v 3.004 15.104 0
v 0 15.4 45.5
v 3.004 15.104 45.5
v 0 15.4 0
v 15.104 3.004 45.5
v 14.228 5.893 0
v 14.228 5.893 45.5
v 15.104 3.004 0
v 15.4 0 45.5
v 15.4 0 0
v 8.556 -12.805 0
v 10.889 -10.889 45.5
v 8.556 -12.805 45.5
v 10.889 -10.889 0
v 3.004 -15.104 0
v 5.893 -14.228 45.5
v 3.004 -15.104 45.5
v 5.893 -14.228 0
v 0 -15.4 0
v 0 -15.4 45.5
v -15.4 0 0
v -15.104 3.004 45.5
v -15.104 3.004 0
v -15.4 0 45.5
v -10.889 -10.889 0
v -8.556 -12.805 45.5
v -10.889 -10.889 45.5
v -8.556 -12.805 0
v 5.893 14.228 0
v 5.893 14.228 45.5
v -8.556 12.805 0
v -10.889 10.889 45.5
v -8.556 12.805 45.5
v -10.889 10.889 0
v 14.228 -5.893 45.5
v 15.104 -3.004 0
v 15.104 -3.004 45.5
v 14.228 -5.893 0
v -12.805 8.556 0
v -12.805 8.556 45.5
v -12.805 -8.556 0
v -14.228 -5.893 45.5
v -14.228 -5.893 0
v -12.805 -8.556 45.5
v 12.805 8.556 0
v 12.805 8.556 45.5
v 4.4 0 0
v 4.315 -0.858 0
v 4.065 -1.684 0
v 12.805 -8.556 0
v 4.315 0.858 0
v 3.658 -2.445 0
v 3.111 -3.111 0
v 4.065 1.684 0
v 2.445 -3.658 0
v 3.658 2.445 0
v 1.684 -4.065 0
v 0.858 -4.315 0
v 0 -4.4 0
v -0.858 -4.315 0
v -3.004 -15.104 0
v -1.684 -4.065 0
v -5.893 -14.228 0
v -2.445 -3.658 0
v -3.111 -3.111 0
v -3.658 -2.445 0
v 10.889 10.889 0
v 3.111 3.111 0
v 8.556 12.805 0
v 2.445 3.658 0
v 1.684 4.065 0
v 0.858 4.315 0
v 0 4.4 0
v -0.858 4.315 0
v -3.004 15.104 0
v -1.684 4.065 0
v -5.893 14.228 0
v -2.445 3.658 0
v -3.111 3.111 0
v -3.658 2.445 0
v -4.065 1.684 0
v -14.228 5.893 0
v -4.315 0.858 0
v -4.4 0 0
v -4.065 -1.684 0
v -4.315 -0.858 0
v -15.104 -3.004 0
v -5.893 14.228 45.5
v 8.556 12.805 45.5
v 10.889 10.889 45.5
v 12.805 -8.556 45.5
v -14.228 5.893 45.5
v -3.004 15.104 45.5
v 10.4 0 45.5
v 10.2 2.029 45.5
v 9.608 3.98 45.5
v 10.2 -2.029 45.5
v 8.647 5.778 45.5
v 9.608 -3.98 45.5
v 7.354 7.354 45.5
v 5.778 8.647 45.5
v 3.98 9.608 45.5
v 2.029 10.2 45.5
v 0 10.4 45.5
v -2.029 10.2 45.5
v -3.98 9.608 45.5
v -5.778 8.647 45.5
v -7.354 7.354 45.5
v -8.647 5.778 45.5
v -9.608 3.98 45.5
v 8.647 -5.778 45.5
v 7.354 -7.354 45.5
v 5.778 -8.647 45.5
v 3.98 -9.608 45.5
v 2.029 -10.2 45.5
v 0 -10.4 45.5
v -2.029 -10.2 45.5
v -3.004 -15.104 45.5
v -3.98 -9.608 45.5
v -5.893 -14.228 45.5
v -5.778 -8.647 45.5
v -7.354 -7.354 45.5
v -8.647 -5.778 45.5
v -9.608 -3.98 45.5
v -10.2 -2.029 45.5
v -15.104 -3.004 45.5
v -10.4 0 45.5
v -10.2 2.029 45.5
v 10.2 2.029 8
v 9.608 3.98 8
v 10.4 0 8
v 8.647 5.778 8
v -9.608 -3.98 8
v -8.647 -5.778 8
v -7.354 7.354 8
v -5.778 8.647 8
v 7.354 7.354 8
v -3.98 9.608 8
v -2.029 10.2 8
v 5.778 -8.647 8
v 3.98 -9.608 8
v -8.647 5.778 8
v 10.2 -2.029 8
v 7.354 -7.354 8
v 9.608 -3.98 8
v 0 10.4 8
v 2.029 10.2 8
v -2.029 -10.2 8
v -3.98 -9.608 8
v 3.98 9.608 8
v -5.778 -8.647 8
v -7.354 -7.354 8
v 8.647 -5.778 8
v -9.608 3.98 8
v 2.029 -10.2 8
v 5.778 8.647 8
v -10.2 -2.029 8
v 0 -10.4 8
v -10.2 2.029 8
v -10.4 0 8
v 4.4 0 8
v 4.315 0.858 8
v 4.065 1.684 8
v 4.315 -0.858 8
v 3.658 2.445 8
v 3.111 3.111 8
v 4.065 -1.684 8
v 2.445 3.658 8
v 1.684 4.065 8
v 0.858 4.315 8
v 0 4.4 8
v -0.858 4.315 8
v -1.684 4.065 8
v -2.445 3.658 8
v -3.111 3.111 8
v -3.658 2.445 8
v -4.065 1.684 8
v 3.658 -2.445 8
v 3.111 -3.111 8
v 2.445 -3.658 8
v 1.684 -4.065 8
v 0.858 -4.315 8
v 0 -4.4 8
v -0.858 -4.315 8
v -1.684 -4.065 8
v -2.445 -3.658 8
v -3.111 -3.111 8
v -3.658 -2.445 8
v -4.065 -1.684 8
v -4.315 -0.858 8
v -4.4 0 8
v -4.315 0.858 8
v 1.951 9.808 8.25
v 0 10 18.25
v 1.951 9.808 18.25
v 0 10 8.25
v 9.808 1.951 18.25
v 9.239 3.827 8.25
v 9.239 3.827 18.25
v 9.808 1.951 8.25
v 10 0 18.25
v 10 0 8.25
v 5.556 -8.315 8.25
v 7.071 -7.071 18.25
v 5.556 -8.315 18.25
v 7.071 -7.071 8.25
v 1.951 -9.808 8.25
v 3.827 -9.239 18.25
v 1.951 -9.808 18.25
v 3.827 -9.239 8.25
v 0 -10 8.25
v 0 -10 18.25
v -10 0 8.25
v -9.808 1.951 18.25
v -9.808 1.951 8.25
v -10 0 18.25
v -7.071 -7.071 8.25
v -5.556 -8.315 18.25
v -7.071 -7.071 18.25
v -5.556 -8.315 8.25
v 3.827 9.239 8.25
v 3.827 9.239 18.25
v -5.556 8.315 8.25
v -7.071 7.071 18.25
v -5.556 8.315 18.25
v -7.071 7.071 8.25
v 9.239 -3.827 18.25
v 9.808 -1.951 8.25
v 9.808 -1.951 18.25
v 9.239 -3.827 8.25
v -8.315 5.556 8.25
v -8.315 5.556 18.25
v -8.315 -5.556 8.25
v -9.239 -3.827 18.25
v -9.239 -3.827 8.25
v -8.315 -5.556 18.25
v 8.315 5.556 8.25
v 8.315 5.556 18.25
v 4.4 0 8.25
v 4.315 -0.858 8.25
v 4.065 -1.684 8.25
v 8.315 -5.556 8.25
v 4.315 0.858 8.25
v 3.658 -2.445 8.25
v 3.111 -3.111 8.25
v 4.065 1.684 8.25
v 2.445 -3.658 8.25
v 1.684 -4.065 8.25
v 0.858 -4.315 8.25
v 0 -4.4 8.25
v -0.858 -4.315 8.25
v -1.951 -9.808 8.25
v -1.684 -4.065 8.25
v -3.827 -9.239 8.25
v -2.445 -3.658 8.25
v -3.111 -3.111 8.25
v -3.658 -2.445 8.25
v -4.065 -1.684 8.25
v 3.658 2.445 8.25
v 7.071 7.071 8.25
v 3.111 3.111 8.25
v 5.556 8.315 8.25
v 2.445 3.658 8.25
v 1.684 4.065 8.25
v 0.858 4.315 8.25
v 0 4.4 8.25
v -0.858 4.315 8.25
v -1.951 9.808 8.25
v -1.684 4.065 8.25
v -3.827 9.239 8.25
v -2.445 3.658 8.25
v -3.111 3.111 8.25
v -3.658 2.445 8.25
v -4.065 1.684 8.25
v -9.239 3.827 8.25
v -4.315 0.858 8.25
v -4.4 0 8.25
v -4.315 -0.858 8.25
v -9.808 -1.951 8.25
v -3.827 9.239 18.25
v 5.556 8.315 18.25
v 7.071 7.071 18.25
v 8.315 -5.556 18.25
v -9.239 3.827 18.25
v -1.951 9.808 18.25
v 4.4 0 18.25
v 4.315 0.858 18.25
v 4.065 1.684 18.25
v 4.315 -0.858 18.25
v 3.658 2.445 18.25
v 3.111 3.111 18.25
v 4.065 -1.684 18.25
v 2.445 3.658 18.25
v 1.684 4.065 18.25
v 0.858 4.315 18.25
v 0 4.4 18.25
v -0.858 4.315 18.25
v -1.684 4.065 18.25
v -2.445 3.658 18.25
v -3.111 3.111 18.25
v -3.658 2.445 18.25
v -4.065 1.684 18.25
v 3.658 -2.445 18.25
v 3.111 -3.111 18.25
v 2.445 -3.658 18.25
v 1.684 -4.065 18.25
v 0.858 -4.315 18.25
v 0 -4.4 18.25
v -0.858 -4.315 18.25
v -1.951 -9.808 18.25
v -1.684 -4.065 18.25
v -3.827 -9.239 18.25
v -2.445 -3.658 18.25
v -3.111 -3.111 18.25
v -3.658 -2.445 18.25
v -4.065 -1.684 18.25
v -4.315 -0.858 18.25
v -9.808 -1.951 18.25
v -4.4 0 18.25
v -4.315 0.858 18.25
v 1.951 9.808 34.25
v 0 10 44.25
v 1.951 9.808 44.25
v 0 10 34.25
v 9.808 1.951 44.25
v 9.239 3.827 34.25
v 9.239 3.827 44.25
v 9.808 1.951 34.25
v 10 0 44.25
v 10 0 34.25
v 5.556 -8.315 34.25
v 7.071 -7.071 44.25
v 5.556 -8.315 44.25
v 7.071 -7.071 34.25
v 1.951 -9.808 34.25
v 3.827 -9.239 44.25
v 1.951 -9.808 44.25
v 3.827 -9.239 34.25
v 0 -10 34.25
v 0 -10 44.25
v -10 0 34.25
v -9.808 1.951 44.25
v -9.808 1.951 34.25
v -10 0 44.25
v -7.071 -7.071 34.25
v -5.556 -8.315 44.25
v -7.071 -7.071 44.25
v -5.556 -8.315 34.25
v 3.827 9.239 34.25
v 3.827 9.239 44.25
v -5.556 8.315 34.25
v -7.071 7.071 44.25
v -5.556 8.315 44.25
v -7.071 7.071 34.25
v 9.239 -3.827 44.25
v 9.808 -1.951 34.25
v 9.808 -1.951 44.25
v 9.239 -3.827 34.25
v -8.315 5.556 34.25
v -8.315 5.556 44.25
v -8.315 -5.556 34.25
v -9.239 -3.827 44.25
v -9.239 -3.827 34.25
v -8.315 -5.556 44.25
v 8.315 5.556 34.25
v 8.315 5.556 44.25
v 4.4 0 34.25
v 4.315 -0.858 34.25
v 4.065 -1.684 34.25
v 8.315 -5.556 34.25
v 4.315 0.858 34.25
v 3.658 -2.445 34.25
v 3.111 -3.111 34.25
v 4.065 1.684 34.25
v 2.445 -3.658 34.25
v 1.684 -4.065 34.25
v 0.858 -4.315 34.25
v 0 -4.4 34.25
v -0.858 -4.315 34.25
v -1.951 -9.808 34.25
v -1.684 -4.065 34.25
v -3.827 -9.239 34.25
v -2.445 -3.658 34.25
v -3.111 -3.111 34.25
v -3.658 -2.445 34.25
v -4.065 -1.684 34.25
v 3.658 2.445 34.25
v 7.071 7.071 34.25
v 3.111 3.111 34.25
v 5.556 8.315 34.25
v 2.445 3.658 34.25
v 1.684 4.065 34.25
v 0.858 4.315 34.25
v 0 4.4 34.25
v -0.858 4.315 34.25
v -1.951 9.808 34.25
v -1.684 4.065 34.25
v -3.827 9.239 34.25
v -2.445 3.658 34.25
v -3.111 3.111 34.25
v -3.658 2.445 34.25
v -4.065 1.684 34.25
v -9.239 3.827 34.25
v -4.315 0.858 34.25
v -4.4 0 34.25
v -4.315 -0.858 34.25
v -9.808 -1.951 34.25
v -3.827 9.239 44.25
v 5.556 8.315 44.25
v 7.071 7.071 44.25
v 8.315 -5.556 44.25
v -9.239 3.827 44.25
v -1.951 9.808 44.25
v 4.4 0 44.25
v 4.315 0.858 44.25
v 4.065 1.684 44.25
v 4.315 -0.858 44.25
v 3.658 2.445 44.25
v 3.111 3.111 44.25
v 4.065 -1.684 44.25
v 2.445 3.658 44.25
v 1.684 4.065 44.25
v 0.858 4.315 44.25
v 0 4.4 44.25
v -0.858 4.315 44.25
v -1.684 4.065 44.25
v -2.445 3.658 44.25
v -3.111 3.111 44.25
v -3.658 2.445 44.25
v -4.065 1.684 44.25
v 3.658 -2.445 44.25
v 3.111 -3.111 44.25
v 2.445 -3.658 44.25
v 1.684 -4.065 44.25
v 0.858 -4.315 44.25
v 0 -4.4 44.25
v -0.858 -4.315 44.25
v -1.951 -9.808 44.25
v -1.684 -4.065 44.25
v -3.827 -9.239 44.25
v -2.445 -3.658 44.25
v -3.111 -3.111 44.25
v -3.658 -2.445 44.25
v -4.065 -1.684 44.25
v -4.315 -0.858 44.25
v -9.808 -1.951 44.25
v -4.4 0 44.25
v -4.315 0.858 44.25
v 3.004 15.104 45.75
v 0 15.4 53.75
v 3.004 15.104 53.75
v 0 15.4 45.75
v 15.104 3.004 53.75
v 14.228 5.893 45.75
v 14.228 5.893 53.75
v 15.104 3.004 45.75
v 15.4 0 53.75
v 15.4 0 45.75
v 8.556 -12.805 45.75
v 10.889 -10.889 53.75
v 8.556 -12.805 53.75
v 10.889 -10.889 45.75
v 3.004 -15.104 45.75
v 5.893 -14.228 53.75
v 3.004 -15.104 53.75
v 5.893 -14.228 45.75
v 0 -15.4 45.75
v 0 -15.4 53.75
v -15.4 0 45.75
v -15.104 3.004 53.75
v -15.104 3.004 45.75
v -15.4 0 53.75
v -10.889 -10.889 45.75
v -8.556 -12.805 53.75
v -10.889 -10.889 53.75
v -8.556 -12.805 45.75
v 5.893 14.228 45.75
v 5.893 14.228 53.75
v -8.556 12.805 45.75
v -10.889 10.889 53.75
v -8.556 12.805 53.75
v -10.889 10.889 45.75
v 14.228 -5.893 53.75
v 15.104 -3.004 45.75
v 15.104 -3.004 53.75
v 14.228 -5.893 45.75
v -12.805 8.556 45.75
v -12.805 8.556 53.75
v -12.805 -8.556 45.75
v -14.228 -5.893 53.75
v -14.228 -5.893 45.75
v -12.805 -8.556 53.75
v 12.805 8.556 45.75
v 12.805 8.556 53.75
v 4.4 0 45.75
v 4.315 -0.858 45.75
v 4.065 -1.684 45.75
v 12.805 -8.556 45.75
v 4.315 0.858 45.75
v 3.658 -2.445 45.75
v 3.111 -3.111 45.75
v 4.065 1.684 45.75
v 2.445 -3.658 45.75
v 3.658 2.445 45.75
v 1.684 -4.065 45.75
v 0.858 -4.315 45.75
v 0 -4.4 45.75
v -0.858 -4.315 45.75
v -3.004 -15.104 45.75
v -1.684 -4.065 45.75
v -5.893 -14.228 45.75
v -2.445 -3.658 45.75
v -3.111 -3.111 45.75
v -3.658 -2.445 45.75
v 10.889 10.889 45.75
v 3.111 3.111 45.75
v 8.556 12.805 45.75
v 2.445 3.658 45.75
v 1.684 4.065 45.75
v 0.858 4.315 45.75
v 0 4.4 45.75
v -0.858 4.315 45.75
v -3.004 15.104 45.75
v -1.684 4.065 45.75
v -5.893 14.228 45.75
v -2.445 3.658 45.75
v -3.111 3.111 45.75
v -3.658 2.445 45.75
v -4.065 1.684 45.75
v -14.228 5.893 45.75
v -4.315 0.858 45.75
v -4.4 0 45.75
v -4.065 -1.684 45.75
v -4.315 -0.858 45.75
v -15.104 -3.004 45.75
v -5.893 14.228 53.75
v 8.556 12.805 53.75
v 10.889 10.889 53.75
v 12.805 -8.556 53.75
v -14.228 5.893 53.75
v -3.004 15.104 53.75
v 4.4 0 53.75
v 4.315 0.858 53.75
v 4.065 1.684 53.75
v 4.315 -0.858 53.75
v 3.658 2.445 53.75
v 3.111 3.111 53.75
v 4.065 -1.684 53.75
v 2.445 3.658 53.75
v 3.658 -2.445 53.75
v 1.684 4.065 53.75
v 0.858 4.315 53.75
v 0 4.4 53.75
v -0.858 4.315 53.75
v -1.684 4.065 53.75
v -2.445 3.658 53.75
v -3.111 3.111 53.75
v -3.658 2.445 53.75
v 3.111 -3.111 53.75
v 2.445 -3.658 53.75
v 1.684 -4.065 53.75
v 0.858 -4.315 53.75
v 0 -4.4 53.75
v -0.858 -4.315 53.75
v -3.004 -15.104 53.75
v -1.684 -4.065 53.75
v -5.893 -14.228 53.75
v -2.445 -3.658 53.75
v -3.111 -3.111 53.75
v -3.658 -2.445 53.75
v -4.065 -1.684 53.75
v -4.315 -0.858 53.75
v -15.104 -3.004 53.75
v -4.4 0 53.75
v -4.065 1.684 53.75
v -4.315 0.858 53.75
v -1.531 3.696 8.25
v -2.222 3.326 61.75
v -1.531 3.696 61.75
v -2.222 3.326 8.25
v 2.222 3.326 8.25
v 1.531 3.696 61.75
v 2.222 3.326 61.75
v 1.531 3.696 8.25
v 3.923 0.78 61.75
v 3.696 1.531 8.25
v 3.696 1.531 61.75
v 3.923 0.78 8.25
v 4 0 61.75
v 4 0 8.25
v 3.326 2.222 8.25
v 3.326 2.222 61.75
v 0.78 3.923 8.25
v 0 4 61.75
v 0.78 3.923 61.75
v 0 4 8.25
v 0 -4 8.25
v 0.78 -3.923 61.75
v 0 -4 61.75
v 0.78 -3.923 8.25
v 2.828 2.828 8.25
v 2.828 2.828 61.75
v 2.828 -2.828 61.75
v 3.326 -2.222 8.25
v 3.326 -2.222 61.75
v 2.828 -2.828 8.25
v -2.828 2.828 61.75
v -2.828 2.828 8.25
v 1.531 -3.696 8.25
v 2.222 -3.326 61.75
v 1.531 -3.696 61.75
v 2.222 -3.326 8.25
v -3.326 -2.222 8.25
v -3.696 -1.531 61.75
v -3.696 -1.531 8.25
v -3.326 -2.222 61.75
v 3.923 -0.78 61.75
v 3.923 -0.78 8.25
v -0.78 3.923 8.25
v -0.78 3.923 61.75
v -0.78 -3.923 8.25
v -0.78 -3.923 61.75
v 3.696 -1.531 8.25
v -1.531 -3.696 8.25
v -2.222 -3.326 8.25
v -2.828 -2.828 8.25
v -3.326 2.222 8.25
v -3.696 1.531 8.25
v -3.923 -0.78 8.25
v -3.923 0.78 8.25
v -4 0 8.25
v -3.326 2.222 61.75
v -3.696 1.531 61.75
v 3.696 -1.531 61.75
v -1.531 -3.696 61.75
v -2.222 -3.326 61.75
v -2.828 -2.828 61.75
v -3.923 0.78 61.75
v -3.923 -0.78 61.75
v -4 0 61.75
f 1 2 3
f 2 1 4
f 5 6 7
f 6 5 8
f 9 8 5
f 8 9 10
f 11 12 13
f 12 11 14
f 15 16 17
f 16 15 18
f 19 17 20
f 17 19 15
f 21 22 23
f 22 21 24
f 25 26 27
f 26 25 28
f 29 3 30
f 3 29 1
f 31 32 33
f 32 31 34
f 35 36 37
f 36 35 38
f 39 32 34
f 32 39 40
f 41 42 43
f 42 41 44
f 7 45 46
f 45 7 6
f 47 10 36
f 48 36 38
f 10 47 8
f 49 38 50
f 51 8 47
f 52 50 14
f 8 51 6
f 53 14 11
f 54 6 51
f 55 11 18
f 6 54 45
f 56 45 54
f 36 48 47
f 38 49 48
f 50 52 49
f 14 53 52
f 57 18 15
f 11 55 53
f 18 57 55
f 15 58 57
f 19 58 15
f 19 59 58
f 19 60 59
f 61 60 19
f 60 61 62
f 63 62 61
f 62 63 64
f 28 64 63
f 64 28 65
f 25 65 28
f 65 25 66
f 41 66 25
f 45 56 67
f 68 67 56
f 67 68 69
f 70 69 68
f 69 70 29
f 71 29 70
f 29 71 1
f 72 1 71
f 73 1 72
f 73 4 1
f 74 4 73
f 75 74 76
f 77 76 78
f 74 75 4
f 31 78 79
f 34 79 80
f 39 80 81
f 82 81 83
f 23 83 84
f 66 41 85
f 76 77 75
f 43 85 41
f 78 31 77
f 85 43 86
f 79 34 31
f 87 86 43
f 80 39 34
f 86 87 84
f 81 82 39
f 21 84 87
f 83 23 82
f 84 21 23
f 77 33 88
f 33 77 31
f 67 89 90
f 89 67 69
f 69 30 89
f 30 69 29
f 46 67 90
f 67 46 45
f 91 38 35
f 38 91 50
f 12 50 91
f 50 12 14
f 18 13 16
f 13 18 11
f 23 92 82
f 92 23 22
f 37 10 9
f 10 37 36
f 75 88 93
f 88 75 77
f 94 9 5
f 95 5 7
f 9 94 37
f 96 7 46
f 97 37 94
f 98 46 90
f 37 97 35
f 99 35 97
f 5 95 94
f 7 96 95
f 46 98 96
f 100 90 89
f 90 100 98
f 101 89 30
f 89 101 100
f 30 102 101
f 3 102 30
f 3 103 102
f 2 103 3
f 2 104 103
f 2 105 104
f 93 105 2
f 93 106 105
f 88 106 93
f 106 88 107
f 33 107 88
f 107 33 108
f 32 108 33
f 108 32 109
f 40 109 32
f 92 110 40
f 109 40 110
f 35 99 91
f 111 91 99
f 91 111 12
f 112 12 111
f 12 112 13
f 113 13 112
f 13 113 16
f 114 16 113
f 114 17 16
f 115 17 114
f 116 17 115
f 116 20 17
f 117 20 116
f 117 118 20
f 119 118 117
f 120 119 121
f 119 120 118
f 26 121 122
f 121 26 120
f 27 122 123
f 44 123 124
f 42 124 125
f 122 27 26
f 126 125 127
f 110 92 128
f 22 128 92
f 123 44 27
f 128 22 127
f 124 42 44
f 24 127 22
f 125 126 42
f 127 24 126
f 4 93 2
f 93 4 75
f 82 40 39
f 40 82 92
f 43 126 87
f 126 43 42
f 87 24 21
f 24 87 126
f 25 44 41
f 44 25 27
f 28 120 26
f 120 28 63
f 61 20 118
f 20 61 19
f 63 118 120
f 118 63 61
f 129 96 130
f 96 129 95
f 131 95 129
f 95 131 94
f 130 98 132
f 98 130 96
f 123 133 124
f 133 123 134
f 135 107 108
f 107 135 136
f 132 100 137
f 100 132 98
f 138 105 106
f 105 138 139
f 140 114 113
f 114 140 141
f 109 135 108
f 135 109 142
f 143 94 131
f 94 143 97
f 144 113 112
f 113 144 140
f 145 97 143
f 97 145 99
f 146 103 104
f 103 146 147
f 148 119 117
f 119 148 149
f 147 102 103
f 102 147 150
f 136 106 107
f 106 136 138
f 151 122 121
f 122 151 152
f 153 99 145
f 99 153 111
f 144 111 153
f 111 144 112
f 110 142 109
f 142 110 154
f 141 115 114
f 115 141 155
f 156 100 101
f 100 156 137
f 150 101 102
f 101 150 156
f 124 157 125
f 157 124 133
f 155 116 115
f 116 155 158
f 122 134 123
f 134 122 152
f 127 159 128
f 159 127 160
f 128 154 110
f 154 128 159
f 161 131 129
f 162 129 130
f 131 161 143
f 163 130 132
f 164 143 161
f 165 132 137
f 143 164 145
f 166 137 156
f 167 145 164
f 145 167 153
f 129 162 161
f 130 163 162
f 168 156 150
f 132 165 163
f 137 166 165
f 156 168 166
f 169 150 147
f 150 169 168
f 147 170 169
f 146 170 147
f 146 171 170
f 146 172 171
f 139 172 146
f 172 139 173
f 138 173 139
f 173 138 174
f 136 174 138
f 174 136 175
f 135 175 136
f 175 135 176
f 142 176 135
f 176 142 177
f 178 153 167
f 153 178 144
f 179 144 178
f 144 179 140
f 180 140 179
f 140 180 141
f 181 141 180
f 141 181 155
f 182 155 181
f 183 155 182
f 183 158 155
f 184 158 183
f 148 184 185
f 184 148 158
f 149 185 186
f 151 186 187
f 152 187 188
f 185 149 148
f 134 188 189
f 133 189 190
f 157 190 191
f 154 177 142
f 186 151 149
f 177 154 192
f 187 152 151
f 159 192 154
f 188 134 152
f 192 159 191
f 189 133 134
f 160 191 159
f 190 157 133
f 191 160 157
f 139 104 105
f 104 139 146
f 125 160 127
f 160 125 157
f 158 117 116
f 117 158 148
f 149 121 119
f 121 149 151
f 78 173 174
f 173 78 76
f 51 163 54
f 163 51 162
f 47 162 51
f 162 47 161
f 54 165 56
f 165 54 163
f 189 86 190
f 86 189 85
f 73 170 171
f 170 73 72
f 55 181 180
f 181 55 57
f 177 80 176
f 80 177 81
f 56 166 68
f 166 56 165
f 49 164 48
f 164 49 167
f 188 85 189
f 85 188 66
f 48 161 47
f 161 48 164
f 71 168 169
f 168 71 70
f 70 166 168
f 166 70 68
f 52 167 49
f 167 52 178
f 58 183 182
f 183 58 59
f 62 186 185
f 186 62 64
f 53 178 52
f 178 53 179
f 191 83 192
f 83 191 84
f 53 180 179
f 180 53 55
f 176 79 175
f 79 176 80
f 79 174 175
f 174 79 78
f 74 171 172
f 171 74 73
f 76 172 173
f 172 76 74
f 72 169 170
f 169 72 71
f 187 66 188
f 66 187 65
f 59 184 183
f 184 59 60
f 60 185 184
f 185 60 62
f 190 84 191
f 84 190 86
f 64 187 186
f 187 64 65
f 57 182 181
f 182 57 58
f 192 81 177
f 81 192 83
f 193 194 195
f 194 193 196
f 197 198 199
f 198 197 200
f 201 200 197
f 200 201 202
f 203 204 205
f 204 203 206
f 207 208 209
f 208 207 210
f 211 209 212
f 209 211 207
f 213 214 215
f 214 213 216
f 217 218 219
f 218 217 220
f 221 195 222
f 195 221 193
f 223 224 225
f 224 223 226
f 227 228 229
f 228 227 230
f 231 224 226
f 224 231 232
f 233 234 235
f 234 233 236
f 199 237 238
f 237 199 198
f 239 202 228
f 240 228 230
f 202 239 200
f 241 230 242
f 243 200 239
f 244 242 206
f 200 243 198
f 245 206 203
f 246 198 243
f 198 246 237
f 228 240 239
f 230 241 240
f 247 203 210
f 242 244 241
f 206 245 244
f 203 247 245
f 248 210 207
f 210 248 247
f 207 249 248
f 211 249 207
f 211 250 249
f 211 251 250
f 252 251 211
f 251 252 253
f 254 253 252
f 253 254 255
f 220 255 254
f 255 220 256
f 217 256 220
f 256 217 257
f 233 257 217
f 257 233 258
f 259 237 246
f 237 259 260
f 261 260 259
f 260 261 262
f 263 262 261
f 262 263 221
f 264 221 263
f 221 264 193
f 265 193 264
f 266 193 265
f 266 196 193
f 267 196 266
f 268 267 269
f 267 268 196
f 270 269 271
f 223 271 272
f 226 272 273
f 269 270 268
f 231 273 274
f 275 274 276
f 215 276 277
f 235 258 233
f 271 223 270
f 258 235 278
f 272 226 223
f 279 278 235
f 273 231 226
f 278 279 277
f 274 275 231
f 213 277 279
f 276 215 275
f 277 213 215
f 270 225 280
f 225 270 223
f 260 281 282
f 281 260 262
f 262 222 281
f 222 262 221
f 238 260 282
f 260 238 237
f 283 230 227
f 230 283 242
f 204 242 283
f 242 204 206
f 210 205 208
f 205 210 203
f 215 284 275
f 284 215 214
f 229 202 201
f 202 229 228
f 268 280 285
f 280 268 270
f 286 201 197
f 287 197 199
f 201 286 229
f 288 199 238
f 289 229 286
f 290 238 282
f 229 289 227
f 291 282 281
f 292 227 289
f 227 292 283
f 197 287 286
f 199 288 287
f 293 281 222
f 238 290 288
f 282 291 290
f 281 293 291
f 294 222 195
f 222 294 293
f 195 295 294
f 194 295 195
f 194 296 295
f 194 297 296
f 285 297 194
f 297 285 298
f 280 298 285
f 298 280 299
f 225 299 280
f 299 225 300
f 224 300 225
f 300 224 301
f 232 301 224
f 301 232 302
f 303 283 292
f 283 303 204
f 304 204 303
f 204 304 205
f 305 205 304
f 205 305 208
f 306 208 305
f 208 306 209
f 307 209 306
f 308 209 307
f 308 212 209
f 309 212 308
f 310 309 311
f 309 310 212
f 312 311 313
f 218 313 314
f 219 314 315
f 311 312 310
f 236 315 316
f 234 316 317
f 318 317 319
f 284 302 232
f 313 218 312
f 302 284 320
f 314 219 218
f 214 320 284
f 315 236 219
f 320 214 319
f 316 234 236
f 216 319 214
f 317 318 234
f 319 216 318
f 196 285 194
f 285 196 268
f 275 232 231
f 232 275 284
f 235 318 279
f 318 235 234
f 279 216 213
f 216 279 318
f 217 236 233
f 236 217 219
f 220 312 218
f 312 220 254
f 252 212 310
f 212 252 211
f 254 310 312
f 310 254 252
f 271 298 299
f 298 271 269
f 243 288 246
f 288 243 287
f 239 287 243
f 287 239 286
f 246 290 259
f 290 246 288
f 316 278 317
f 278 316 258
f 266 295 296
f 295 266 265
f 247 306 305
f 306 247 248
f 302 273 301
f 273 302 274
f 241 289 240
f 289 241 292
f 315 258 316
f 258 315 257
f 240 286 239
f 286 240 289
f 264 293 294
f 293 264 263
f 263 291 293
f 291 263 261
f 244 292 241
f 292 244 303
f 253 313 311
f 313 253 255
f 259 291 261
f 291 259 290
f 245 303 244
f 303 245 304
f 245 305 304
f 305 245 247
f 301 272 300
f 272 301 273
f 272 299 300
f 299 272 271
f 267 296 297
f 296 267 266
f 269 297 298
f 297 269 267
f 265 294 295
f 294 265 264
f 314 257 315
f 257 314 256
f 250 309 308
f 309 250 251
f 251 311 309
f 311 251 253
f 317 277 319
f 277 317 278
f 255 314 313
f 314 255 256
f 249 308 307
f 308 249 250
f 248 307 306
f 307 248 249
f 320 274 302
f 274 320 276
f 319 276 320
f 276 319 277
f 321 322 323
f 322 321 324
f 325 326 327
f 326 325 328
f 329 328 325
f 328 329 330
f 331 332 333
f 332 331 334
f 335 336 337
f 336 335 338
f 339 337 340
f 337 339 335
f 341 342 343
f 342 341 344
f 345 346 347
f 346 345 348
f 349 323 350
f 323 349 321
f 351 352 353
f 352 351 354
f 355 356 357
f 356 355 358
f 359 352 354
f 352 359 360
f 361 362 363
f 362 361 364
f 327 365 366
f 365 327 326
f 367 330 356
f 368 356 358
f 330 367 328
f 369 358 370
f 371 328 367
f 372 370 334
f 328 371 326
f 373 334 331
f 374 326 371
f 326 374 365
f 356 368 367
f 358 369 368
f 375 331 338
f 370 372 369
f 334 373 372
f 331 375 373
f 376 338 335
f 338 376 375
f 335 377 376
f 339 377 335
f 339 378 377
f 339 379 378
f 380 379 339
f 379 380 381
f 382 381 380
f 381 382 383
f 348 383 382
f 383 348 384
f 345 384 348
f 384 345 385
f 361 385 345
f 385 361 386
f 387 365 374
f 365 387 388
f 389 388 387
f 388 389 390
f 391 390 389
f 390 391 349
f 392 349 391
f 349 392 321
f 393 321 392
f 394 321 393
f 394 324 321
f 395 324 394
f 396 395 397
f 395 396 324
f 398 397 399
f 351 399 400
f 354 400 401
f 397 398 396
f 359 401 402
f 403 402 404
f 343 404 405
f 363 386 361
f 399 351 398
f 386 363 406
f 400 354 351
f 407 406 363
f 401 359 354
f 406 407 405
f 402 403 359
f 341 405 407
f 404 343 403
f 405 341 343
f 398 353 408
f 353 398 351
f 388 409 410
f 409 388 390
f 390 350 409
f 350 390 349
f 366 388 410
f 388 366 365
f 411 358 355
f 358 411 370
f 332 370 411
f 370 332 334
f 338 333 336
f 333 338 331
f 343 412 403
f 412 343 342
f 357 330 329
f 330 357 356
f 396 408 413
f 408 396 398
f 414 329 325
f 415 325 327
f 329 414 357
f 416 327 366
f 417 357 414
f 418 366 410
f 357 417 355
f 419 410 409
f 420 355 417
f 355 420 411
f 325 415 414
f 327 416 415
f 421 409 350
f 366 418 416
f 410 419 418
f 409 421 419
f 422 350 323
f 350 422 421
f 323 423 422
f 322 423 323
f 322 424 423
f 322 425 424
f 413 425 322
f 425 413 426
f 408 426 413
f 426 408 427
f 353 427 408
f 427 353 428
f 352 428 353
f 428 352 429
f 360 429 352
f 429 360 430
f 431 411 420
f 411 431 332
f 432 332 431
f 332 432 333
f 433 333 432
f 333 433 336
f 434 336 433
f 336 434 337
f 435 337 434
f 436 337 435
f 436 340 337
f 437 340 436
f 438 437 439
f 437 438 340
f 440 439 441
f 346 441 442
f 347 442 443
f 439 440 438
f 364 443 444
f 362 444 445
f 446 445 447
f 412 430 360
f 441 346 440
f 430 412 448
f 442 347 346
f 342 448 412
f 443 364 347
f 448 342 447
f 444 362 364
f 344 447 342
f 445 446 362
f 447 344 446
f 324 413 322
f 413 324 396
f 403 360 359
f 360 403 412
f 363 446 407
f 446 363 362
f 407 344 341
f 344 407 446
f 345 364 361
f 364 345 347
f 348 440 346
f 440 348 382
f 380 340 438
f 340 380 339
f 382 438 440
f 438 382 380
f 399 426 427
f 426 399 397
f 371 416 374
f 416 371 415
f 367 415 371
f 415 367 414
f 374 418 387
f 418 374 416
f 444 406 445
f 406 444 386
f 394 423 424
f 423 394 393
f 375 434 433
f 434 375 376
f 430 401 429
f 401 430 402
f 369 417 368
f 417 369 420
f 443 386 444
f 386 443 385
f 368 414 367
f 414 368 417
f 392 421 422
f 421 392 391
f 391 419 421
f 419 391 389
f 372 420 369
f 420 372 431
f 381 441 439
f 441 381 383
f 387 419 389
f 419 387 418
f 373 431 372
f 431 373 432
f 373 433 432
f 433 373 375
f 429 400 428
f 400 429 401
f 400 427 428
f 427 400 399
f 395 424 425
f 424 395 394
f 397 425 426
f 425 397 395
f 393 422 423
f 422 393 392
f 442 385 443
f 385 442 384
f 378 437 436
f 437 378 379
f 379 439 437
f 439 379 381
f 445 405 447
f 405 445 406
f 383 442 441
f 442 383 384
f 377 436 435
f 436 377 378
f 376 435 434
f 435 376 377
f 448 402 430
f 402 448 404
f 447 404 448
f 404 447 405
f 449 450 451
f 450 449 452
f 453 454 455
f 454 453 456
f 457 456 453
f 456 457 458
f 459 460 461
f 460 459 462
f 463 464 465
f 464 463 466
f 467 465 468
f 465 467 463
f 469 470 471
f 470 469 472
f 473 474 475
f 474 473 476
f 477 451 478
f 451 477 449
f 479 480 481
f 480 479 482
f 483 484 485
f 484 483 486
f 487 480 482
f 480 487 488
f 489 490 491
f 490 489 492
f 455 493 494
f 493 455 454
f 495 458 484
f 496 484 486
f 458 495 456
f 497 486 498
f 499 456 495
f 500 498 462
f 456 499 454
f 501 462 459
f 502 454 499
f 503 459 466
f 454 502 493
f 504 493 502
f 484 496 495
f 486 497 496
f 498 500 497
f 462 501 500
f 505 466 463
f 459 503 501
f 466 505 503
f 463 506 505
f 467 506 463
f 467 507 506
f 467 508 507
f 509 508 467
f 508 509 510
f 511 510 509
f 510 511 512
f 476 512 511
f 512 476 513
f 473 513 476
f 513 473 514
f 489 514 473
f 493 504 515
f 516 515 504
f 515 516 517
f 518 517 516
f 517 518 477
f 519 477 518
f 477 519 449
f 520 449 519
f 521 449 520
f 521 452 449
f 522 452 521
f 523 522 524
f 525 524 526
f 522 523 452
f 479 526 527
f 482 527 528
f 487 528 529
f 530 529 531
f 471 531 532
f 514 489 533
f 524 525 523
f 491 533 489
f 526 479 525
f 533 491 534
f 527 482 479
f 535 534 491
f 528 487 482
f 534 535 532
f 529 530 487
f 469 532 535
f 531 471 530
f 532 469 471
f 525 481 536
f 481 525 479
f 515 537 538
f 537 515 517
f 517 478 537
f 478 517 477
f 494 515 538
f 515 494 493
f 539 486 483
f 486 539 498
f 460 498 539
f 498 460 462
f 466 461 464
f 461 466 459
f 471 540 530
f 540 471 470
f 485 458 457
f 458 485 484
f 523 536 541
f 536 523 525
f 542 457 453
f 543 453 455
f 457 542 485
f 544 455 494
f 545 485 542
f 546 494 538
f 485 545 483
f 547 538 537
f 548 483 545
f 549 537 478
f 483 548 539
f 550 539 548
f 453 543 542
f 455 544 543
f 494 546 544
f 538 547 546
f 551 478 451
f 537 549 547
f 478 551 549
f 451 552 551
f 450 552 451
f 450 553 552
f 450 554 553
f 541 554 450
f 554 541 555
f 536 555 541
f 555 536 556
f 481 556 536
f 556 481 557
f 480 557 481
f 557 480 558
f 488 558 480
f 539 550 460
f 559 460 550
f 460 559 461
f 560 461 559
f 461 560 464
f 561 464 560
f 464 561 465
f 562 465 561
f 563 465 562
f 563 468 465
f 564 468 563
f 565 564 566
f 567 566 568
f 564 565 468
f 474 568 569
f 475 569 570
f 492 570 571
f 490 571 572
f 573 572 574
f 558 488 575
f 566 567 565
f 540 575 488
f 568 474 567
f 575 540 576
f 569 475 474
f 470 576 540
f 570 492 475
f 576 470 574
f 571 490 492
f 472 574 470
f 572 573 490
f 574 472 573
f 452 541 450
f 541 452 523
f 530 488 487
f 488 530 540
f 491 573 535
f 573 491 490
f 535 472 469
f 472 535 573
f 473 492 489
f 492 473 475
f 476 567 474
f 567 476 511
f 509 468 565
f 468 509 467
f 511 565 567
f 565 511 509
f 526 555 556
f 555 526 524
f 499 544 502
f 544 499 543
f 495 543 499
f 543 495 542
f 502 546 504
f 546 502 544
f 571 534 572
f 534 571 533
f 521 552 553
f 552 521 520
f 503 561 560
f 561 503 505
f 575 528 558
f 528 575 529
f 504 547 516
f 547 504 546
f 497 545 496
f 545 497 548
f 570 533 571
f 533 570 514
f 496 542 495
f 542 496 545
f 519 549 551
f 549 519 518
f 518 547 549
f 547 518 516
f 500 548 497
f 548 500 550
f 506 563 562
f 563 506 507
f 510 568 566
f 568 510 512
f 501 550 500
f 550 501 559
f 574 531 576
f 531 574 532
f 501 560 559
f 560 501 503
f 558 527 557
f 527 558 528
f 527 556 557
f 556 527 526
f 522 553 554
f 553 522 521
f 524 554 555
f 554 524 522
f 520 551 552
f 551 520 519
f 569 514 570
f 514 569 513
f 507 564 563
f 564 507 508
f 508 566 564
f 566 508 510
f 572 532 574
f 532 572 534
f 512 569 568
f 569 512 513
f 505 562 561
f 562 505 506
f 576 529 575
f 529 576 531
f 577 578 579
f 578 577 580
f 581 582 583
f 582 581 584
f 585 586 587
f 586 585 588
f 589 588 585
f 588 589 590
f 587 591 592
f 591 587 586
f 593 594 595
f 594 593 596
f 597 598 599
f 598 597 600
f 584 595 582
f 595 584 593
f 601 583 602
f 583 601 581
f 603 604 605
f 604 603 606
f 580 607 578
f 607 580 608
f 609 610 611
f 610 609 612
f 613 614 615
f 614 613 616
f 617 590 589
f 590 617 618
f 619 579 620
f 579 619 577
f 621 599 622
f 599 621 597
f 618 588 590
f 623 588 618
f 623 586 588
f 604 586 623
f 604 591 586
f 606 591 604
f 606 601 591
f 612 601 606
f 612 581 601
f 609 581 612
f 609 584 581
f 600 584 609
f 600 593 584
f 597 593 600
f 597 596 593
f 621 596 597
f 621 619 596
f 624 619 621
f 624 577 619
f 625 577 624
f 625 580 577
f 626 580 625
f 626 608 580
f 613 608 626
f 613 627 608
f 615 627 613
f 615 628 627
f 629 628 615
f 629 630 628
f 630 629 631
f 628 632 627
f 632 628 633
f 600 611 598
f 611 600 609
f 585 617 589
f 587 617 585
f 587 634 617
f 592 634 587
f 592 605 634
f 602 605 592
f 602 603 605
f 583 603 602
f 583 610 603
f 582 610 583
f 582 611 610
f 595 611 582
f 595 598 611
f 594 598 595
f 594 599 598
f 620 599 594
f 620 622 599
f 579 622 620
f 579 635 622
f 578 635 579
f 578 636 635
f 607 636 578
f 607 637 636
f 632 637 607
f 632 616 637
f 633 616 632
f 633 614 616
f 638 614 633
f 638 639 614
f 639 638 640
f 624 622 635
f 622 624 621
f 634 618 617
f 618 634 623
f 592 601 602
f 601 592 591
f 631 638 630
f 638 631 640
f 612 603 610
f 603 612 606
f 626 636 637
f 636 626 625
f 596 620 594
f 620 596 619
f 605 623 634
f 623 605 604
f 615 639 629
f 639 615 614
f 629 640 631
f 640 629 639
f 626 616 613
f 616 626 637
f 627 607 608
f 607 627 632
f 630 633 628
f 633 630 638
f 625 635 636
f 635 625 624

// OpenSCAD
$fn = 32;

// ------------------------------------------------------------------------
// Shaft station: cup d30.8 x 45.5 mm, shaft d8
// Every part is its own module, assembly() places every instance.
// ------------------------------------------------------------------------

// --- part 1 ---
module housing_cup() {
  difference() {
    cylinder(h = 45.5, d = 30.8);
    translate([0, 0, 8]) cylinder(h = 38.5, d = 20.8);
    translate([0, 0, -1]) cylinder(h = 10, d = 8.8);
  }
}

// --- part 2 ---
module bearing_lower() {
  difference() {
      translate([0, 0, 0]) cylinder(h = 10, d = 20);
      translate([0, 0, -1]) cylinder(h = 12, d = 8.8);
    }
}

// --- part 3 ---
module bearing_upper() {
  difference() {
      translate([0, 0, 0]) cylinder(h = 10, d = 20);
      translate([0, 0, -1]) cylinder(h = 12, d = 8.8);
    }
}

// --- part 4 ---
module station_shaft() {
  translate([0, 0, -26.75]) cylinder(h = 53.5, d = 8);
}

// --- part 5 ---
module station_cover() {
  difference() {
    cylinder(h = 8, d = 30.8);
    translate([0, 0, -1]) cylinder(h = 10, d = 8.8);
  }
}

// --- assembly ---
module assembly() {
  color([0.80, 0.24, 0.20]) translate([0, 0, 0]) rotate([0, 0, 0]) housing_cup();
  color([0.20, 0.45, 0.75]) translate([0, 0, 8.25]) rotate([0, 0, 0]) bearing_lower();
  color([0.25, 0.62, 0.32]) translate([0, 0, 34.25]) rotate([0, 0, 0]) bearing_upper();
  color([0.92, 0.70, 0.18]) translate([0, 0, 35]) rotate([0, 0, 0]) station_shaft();
  color([0.58, 0.35, 0.70]) translate([0, 0, 45.75]) rotate([0, 0, 0]) station_cover();
}

assembly();
